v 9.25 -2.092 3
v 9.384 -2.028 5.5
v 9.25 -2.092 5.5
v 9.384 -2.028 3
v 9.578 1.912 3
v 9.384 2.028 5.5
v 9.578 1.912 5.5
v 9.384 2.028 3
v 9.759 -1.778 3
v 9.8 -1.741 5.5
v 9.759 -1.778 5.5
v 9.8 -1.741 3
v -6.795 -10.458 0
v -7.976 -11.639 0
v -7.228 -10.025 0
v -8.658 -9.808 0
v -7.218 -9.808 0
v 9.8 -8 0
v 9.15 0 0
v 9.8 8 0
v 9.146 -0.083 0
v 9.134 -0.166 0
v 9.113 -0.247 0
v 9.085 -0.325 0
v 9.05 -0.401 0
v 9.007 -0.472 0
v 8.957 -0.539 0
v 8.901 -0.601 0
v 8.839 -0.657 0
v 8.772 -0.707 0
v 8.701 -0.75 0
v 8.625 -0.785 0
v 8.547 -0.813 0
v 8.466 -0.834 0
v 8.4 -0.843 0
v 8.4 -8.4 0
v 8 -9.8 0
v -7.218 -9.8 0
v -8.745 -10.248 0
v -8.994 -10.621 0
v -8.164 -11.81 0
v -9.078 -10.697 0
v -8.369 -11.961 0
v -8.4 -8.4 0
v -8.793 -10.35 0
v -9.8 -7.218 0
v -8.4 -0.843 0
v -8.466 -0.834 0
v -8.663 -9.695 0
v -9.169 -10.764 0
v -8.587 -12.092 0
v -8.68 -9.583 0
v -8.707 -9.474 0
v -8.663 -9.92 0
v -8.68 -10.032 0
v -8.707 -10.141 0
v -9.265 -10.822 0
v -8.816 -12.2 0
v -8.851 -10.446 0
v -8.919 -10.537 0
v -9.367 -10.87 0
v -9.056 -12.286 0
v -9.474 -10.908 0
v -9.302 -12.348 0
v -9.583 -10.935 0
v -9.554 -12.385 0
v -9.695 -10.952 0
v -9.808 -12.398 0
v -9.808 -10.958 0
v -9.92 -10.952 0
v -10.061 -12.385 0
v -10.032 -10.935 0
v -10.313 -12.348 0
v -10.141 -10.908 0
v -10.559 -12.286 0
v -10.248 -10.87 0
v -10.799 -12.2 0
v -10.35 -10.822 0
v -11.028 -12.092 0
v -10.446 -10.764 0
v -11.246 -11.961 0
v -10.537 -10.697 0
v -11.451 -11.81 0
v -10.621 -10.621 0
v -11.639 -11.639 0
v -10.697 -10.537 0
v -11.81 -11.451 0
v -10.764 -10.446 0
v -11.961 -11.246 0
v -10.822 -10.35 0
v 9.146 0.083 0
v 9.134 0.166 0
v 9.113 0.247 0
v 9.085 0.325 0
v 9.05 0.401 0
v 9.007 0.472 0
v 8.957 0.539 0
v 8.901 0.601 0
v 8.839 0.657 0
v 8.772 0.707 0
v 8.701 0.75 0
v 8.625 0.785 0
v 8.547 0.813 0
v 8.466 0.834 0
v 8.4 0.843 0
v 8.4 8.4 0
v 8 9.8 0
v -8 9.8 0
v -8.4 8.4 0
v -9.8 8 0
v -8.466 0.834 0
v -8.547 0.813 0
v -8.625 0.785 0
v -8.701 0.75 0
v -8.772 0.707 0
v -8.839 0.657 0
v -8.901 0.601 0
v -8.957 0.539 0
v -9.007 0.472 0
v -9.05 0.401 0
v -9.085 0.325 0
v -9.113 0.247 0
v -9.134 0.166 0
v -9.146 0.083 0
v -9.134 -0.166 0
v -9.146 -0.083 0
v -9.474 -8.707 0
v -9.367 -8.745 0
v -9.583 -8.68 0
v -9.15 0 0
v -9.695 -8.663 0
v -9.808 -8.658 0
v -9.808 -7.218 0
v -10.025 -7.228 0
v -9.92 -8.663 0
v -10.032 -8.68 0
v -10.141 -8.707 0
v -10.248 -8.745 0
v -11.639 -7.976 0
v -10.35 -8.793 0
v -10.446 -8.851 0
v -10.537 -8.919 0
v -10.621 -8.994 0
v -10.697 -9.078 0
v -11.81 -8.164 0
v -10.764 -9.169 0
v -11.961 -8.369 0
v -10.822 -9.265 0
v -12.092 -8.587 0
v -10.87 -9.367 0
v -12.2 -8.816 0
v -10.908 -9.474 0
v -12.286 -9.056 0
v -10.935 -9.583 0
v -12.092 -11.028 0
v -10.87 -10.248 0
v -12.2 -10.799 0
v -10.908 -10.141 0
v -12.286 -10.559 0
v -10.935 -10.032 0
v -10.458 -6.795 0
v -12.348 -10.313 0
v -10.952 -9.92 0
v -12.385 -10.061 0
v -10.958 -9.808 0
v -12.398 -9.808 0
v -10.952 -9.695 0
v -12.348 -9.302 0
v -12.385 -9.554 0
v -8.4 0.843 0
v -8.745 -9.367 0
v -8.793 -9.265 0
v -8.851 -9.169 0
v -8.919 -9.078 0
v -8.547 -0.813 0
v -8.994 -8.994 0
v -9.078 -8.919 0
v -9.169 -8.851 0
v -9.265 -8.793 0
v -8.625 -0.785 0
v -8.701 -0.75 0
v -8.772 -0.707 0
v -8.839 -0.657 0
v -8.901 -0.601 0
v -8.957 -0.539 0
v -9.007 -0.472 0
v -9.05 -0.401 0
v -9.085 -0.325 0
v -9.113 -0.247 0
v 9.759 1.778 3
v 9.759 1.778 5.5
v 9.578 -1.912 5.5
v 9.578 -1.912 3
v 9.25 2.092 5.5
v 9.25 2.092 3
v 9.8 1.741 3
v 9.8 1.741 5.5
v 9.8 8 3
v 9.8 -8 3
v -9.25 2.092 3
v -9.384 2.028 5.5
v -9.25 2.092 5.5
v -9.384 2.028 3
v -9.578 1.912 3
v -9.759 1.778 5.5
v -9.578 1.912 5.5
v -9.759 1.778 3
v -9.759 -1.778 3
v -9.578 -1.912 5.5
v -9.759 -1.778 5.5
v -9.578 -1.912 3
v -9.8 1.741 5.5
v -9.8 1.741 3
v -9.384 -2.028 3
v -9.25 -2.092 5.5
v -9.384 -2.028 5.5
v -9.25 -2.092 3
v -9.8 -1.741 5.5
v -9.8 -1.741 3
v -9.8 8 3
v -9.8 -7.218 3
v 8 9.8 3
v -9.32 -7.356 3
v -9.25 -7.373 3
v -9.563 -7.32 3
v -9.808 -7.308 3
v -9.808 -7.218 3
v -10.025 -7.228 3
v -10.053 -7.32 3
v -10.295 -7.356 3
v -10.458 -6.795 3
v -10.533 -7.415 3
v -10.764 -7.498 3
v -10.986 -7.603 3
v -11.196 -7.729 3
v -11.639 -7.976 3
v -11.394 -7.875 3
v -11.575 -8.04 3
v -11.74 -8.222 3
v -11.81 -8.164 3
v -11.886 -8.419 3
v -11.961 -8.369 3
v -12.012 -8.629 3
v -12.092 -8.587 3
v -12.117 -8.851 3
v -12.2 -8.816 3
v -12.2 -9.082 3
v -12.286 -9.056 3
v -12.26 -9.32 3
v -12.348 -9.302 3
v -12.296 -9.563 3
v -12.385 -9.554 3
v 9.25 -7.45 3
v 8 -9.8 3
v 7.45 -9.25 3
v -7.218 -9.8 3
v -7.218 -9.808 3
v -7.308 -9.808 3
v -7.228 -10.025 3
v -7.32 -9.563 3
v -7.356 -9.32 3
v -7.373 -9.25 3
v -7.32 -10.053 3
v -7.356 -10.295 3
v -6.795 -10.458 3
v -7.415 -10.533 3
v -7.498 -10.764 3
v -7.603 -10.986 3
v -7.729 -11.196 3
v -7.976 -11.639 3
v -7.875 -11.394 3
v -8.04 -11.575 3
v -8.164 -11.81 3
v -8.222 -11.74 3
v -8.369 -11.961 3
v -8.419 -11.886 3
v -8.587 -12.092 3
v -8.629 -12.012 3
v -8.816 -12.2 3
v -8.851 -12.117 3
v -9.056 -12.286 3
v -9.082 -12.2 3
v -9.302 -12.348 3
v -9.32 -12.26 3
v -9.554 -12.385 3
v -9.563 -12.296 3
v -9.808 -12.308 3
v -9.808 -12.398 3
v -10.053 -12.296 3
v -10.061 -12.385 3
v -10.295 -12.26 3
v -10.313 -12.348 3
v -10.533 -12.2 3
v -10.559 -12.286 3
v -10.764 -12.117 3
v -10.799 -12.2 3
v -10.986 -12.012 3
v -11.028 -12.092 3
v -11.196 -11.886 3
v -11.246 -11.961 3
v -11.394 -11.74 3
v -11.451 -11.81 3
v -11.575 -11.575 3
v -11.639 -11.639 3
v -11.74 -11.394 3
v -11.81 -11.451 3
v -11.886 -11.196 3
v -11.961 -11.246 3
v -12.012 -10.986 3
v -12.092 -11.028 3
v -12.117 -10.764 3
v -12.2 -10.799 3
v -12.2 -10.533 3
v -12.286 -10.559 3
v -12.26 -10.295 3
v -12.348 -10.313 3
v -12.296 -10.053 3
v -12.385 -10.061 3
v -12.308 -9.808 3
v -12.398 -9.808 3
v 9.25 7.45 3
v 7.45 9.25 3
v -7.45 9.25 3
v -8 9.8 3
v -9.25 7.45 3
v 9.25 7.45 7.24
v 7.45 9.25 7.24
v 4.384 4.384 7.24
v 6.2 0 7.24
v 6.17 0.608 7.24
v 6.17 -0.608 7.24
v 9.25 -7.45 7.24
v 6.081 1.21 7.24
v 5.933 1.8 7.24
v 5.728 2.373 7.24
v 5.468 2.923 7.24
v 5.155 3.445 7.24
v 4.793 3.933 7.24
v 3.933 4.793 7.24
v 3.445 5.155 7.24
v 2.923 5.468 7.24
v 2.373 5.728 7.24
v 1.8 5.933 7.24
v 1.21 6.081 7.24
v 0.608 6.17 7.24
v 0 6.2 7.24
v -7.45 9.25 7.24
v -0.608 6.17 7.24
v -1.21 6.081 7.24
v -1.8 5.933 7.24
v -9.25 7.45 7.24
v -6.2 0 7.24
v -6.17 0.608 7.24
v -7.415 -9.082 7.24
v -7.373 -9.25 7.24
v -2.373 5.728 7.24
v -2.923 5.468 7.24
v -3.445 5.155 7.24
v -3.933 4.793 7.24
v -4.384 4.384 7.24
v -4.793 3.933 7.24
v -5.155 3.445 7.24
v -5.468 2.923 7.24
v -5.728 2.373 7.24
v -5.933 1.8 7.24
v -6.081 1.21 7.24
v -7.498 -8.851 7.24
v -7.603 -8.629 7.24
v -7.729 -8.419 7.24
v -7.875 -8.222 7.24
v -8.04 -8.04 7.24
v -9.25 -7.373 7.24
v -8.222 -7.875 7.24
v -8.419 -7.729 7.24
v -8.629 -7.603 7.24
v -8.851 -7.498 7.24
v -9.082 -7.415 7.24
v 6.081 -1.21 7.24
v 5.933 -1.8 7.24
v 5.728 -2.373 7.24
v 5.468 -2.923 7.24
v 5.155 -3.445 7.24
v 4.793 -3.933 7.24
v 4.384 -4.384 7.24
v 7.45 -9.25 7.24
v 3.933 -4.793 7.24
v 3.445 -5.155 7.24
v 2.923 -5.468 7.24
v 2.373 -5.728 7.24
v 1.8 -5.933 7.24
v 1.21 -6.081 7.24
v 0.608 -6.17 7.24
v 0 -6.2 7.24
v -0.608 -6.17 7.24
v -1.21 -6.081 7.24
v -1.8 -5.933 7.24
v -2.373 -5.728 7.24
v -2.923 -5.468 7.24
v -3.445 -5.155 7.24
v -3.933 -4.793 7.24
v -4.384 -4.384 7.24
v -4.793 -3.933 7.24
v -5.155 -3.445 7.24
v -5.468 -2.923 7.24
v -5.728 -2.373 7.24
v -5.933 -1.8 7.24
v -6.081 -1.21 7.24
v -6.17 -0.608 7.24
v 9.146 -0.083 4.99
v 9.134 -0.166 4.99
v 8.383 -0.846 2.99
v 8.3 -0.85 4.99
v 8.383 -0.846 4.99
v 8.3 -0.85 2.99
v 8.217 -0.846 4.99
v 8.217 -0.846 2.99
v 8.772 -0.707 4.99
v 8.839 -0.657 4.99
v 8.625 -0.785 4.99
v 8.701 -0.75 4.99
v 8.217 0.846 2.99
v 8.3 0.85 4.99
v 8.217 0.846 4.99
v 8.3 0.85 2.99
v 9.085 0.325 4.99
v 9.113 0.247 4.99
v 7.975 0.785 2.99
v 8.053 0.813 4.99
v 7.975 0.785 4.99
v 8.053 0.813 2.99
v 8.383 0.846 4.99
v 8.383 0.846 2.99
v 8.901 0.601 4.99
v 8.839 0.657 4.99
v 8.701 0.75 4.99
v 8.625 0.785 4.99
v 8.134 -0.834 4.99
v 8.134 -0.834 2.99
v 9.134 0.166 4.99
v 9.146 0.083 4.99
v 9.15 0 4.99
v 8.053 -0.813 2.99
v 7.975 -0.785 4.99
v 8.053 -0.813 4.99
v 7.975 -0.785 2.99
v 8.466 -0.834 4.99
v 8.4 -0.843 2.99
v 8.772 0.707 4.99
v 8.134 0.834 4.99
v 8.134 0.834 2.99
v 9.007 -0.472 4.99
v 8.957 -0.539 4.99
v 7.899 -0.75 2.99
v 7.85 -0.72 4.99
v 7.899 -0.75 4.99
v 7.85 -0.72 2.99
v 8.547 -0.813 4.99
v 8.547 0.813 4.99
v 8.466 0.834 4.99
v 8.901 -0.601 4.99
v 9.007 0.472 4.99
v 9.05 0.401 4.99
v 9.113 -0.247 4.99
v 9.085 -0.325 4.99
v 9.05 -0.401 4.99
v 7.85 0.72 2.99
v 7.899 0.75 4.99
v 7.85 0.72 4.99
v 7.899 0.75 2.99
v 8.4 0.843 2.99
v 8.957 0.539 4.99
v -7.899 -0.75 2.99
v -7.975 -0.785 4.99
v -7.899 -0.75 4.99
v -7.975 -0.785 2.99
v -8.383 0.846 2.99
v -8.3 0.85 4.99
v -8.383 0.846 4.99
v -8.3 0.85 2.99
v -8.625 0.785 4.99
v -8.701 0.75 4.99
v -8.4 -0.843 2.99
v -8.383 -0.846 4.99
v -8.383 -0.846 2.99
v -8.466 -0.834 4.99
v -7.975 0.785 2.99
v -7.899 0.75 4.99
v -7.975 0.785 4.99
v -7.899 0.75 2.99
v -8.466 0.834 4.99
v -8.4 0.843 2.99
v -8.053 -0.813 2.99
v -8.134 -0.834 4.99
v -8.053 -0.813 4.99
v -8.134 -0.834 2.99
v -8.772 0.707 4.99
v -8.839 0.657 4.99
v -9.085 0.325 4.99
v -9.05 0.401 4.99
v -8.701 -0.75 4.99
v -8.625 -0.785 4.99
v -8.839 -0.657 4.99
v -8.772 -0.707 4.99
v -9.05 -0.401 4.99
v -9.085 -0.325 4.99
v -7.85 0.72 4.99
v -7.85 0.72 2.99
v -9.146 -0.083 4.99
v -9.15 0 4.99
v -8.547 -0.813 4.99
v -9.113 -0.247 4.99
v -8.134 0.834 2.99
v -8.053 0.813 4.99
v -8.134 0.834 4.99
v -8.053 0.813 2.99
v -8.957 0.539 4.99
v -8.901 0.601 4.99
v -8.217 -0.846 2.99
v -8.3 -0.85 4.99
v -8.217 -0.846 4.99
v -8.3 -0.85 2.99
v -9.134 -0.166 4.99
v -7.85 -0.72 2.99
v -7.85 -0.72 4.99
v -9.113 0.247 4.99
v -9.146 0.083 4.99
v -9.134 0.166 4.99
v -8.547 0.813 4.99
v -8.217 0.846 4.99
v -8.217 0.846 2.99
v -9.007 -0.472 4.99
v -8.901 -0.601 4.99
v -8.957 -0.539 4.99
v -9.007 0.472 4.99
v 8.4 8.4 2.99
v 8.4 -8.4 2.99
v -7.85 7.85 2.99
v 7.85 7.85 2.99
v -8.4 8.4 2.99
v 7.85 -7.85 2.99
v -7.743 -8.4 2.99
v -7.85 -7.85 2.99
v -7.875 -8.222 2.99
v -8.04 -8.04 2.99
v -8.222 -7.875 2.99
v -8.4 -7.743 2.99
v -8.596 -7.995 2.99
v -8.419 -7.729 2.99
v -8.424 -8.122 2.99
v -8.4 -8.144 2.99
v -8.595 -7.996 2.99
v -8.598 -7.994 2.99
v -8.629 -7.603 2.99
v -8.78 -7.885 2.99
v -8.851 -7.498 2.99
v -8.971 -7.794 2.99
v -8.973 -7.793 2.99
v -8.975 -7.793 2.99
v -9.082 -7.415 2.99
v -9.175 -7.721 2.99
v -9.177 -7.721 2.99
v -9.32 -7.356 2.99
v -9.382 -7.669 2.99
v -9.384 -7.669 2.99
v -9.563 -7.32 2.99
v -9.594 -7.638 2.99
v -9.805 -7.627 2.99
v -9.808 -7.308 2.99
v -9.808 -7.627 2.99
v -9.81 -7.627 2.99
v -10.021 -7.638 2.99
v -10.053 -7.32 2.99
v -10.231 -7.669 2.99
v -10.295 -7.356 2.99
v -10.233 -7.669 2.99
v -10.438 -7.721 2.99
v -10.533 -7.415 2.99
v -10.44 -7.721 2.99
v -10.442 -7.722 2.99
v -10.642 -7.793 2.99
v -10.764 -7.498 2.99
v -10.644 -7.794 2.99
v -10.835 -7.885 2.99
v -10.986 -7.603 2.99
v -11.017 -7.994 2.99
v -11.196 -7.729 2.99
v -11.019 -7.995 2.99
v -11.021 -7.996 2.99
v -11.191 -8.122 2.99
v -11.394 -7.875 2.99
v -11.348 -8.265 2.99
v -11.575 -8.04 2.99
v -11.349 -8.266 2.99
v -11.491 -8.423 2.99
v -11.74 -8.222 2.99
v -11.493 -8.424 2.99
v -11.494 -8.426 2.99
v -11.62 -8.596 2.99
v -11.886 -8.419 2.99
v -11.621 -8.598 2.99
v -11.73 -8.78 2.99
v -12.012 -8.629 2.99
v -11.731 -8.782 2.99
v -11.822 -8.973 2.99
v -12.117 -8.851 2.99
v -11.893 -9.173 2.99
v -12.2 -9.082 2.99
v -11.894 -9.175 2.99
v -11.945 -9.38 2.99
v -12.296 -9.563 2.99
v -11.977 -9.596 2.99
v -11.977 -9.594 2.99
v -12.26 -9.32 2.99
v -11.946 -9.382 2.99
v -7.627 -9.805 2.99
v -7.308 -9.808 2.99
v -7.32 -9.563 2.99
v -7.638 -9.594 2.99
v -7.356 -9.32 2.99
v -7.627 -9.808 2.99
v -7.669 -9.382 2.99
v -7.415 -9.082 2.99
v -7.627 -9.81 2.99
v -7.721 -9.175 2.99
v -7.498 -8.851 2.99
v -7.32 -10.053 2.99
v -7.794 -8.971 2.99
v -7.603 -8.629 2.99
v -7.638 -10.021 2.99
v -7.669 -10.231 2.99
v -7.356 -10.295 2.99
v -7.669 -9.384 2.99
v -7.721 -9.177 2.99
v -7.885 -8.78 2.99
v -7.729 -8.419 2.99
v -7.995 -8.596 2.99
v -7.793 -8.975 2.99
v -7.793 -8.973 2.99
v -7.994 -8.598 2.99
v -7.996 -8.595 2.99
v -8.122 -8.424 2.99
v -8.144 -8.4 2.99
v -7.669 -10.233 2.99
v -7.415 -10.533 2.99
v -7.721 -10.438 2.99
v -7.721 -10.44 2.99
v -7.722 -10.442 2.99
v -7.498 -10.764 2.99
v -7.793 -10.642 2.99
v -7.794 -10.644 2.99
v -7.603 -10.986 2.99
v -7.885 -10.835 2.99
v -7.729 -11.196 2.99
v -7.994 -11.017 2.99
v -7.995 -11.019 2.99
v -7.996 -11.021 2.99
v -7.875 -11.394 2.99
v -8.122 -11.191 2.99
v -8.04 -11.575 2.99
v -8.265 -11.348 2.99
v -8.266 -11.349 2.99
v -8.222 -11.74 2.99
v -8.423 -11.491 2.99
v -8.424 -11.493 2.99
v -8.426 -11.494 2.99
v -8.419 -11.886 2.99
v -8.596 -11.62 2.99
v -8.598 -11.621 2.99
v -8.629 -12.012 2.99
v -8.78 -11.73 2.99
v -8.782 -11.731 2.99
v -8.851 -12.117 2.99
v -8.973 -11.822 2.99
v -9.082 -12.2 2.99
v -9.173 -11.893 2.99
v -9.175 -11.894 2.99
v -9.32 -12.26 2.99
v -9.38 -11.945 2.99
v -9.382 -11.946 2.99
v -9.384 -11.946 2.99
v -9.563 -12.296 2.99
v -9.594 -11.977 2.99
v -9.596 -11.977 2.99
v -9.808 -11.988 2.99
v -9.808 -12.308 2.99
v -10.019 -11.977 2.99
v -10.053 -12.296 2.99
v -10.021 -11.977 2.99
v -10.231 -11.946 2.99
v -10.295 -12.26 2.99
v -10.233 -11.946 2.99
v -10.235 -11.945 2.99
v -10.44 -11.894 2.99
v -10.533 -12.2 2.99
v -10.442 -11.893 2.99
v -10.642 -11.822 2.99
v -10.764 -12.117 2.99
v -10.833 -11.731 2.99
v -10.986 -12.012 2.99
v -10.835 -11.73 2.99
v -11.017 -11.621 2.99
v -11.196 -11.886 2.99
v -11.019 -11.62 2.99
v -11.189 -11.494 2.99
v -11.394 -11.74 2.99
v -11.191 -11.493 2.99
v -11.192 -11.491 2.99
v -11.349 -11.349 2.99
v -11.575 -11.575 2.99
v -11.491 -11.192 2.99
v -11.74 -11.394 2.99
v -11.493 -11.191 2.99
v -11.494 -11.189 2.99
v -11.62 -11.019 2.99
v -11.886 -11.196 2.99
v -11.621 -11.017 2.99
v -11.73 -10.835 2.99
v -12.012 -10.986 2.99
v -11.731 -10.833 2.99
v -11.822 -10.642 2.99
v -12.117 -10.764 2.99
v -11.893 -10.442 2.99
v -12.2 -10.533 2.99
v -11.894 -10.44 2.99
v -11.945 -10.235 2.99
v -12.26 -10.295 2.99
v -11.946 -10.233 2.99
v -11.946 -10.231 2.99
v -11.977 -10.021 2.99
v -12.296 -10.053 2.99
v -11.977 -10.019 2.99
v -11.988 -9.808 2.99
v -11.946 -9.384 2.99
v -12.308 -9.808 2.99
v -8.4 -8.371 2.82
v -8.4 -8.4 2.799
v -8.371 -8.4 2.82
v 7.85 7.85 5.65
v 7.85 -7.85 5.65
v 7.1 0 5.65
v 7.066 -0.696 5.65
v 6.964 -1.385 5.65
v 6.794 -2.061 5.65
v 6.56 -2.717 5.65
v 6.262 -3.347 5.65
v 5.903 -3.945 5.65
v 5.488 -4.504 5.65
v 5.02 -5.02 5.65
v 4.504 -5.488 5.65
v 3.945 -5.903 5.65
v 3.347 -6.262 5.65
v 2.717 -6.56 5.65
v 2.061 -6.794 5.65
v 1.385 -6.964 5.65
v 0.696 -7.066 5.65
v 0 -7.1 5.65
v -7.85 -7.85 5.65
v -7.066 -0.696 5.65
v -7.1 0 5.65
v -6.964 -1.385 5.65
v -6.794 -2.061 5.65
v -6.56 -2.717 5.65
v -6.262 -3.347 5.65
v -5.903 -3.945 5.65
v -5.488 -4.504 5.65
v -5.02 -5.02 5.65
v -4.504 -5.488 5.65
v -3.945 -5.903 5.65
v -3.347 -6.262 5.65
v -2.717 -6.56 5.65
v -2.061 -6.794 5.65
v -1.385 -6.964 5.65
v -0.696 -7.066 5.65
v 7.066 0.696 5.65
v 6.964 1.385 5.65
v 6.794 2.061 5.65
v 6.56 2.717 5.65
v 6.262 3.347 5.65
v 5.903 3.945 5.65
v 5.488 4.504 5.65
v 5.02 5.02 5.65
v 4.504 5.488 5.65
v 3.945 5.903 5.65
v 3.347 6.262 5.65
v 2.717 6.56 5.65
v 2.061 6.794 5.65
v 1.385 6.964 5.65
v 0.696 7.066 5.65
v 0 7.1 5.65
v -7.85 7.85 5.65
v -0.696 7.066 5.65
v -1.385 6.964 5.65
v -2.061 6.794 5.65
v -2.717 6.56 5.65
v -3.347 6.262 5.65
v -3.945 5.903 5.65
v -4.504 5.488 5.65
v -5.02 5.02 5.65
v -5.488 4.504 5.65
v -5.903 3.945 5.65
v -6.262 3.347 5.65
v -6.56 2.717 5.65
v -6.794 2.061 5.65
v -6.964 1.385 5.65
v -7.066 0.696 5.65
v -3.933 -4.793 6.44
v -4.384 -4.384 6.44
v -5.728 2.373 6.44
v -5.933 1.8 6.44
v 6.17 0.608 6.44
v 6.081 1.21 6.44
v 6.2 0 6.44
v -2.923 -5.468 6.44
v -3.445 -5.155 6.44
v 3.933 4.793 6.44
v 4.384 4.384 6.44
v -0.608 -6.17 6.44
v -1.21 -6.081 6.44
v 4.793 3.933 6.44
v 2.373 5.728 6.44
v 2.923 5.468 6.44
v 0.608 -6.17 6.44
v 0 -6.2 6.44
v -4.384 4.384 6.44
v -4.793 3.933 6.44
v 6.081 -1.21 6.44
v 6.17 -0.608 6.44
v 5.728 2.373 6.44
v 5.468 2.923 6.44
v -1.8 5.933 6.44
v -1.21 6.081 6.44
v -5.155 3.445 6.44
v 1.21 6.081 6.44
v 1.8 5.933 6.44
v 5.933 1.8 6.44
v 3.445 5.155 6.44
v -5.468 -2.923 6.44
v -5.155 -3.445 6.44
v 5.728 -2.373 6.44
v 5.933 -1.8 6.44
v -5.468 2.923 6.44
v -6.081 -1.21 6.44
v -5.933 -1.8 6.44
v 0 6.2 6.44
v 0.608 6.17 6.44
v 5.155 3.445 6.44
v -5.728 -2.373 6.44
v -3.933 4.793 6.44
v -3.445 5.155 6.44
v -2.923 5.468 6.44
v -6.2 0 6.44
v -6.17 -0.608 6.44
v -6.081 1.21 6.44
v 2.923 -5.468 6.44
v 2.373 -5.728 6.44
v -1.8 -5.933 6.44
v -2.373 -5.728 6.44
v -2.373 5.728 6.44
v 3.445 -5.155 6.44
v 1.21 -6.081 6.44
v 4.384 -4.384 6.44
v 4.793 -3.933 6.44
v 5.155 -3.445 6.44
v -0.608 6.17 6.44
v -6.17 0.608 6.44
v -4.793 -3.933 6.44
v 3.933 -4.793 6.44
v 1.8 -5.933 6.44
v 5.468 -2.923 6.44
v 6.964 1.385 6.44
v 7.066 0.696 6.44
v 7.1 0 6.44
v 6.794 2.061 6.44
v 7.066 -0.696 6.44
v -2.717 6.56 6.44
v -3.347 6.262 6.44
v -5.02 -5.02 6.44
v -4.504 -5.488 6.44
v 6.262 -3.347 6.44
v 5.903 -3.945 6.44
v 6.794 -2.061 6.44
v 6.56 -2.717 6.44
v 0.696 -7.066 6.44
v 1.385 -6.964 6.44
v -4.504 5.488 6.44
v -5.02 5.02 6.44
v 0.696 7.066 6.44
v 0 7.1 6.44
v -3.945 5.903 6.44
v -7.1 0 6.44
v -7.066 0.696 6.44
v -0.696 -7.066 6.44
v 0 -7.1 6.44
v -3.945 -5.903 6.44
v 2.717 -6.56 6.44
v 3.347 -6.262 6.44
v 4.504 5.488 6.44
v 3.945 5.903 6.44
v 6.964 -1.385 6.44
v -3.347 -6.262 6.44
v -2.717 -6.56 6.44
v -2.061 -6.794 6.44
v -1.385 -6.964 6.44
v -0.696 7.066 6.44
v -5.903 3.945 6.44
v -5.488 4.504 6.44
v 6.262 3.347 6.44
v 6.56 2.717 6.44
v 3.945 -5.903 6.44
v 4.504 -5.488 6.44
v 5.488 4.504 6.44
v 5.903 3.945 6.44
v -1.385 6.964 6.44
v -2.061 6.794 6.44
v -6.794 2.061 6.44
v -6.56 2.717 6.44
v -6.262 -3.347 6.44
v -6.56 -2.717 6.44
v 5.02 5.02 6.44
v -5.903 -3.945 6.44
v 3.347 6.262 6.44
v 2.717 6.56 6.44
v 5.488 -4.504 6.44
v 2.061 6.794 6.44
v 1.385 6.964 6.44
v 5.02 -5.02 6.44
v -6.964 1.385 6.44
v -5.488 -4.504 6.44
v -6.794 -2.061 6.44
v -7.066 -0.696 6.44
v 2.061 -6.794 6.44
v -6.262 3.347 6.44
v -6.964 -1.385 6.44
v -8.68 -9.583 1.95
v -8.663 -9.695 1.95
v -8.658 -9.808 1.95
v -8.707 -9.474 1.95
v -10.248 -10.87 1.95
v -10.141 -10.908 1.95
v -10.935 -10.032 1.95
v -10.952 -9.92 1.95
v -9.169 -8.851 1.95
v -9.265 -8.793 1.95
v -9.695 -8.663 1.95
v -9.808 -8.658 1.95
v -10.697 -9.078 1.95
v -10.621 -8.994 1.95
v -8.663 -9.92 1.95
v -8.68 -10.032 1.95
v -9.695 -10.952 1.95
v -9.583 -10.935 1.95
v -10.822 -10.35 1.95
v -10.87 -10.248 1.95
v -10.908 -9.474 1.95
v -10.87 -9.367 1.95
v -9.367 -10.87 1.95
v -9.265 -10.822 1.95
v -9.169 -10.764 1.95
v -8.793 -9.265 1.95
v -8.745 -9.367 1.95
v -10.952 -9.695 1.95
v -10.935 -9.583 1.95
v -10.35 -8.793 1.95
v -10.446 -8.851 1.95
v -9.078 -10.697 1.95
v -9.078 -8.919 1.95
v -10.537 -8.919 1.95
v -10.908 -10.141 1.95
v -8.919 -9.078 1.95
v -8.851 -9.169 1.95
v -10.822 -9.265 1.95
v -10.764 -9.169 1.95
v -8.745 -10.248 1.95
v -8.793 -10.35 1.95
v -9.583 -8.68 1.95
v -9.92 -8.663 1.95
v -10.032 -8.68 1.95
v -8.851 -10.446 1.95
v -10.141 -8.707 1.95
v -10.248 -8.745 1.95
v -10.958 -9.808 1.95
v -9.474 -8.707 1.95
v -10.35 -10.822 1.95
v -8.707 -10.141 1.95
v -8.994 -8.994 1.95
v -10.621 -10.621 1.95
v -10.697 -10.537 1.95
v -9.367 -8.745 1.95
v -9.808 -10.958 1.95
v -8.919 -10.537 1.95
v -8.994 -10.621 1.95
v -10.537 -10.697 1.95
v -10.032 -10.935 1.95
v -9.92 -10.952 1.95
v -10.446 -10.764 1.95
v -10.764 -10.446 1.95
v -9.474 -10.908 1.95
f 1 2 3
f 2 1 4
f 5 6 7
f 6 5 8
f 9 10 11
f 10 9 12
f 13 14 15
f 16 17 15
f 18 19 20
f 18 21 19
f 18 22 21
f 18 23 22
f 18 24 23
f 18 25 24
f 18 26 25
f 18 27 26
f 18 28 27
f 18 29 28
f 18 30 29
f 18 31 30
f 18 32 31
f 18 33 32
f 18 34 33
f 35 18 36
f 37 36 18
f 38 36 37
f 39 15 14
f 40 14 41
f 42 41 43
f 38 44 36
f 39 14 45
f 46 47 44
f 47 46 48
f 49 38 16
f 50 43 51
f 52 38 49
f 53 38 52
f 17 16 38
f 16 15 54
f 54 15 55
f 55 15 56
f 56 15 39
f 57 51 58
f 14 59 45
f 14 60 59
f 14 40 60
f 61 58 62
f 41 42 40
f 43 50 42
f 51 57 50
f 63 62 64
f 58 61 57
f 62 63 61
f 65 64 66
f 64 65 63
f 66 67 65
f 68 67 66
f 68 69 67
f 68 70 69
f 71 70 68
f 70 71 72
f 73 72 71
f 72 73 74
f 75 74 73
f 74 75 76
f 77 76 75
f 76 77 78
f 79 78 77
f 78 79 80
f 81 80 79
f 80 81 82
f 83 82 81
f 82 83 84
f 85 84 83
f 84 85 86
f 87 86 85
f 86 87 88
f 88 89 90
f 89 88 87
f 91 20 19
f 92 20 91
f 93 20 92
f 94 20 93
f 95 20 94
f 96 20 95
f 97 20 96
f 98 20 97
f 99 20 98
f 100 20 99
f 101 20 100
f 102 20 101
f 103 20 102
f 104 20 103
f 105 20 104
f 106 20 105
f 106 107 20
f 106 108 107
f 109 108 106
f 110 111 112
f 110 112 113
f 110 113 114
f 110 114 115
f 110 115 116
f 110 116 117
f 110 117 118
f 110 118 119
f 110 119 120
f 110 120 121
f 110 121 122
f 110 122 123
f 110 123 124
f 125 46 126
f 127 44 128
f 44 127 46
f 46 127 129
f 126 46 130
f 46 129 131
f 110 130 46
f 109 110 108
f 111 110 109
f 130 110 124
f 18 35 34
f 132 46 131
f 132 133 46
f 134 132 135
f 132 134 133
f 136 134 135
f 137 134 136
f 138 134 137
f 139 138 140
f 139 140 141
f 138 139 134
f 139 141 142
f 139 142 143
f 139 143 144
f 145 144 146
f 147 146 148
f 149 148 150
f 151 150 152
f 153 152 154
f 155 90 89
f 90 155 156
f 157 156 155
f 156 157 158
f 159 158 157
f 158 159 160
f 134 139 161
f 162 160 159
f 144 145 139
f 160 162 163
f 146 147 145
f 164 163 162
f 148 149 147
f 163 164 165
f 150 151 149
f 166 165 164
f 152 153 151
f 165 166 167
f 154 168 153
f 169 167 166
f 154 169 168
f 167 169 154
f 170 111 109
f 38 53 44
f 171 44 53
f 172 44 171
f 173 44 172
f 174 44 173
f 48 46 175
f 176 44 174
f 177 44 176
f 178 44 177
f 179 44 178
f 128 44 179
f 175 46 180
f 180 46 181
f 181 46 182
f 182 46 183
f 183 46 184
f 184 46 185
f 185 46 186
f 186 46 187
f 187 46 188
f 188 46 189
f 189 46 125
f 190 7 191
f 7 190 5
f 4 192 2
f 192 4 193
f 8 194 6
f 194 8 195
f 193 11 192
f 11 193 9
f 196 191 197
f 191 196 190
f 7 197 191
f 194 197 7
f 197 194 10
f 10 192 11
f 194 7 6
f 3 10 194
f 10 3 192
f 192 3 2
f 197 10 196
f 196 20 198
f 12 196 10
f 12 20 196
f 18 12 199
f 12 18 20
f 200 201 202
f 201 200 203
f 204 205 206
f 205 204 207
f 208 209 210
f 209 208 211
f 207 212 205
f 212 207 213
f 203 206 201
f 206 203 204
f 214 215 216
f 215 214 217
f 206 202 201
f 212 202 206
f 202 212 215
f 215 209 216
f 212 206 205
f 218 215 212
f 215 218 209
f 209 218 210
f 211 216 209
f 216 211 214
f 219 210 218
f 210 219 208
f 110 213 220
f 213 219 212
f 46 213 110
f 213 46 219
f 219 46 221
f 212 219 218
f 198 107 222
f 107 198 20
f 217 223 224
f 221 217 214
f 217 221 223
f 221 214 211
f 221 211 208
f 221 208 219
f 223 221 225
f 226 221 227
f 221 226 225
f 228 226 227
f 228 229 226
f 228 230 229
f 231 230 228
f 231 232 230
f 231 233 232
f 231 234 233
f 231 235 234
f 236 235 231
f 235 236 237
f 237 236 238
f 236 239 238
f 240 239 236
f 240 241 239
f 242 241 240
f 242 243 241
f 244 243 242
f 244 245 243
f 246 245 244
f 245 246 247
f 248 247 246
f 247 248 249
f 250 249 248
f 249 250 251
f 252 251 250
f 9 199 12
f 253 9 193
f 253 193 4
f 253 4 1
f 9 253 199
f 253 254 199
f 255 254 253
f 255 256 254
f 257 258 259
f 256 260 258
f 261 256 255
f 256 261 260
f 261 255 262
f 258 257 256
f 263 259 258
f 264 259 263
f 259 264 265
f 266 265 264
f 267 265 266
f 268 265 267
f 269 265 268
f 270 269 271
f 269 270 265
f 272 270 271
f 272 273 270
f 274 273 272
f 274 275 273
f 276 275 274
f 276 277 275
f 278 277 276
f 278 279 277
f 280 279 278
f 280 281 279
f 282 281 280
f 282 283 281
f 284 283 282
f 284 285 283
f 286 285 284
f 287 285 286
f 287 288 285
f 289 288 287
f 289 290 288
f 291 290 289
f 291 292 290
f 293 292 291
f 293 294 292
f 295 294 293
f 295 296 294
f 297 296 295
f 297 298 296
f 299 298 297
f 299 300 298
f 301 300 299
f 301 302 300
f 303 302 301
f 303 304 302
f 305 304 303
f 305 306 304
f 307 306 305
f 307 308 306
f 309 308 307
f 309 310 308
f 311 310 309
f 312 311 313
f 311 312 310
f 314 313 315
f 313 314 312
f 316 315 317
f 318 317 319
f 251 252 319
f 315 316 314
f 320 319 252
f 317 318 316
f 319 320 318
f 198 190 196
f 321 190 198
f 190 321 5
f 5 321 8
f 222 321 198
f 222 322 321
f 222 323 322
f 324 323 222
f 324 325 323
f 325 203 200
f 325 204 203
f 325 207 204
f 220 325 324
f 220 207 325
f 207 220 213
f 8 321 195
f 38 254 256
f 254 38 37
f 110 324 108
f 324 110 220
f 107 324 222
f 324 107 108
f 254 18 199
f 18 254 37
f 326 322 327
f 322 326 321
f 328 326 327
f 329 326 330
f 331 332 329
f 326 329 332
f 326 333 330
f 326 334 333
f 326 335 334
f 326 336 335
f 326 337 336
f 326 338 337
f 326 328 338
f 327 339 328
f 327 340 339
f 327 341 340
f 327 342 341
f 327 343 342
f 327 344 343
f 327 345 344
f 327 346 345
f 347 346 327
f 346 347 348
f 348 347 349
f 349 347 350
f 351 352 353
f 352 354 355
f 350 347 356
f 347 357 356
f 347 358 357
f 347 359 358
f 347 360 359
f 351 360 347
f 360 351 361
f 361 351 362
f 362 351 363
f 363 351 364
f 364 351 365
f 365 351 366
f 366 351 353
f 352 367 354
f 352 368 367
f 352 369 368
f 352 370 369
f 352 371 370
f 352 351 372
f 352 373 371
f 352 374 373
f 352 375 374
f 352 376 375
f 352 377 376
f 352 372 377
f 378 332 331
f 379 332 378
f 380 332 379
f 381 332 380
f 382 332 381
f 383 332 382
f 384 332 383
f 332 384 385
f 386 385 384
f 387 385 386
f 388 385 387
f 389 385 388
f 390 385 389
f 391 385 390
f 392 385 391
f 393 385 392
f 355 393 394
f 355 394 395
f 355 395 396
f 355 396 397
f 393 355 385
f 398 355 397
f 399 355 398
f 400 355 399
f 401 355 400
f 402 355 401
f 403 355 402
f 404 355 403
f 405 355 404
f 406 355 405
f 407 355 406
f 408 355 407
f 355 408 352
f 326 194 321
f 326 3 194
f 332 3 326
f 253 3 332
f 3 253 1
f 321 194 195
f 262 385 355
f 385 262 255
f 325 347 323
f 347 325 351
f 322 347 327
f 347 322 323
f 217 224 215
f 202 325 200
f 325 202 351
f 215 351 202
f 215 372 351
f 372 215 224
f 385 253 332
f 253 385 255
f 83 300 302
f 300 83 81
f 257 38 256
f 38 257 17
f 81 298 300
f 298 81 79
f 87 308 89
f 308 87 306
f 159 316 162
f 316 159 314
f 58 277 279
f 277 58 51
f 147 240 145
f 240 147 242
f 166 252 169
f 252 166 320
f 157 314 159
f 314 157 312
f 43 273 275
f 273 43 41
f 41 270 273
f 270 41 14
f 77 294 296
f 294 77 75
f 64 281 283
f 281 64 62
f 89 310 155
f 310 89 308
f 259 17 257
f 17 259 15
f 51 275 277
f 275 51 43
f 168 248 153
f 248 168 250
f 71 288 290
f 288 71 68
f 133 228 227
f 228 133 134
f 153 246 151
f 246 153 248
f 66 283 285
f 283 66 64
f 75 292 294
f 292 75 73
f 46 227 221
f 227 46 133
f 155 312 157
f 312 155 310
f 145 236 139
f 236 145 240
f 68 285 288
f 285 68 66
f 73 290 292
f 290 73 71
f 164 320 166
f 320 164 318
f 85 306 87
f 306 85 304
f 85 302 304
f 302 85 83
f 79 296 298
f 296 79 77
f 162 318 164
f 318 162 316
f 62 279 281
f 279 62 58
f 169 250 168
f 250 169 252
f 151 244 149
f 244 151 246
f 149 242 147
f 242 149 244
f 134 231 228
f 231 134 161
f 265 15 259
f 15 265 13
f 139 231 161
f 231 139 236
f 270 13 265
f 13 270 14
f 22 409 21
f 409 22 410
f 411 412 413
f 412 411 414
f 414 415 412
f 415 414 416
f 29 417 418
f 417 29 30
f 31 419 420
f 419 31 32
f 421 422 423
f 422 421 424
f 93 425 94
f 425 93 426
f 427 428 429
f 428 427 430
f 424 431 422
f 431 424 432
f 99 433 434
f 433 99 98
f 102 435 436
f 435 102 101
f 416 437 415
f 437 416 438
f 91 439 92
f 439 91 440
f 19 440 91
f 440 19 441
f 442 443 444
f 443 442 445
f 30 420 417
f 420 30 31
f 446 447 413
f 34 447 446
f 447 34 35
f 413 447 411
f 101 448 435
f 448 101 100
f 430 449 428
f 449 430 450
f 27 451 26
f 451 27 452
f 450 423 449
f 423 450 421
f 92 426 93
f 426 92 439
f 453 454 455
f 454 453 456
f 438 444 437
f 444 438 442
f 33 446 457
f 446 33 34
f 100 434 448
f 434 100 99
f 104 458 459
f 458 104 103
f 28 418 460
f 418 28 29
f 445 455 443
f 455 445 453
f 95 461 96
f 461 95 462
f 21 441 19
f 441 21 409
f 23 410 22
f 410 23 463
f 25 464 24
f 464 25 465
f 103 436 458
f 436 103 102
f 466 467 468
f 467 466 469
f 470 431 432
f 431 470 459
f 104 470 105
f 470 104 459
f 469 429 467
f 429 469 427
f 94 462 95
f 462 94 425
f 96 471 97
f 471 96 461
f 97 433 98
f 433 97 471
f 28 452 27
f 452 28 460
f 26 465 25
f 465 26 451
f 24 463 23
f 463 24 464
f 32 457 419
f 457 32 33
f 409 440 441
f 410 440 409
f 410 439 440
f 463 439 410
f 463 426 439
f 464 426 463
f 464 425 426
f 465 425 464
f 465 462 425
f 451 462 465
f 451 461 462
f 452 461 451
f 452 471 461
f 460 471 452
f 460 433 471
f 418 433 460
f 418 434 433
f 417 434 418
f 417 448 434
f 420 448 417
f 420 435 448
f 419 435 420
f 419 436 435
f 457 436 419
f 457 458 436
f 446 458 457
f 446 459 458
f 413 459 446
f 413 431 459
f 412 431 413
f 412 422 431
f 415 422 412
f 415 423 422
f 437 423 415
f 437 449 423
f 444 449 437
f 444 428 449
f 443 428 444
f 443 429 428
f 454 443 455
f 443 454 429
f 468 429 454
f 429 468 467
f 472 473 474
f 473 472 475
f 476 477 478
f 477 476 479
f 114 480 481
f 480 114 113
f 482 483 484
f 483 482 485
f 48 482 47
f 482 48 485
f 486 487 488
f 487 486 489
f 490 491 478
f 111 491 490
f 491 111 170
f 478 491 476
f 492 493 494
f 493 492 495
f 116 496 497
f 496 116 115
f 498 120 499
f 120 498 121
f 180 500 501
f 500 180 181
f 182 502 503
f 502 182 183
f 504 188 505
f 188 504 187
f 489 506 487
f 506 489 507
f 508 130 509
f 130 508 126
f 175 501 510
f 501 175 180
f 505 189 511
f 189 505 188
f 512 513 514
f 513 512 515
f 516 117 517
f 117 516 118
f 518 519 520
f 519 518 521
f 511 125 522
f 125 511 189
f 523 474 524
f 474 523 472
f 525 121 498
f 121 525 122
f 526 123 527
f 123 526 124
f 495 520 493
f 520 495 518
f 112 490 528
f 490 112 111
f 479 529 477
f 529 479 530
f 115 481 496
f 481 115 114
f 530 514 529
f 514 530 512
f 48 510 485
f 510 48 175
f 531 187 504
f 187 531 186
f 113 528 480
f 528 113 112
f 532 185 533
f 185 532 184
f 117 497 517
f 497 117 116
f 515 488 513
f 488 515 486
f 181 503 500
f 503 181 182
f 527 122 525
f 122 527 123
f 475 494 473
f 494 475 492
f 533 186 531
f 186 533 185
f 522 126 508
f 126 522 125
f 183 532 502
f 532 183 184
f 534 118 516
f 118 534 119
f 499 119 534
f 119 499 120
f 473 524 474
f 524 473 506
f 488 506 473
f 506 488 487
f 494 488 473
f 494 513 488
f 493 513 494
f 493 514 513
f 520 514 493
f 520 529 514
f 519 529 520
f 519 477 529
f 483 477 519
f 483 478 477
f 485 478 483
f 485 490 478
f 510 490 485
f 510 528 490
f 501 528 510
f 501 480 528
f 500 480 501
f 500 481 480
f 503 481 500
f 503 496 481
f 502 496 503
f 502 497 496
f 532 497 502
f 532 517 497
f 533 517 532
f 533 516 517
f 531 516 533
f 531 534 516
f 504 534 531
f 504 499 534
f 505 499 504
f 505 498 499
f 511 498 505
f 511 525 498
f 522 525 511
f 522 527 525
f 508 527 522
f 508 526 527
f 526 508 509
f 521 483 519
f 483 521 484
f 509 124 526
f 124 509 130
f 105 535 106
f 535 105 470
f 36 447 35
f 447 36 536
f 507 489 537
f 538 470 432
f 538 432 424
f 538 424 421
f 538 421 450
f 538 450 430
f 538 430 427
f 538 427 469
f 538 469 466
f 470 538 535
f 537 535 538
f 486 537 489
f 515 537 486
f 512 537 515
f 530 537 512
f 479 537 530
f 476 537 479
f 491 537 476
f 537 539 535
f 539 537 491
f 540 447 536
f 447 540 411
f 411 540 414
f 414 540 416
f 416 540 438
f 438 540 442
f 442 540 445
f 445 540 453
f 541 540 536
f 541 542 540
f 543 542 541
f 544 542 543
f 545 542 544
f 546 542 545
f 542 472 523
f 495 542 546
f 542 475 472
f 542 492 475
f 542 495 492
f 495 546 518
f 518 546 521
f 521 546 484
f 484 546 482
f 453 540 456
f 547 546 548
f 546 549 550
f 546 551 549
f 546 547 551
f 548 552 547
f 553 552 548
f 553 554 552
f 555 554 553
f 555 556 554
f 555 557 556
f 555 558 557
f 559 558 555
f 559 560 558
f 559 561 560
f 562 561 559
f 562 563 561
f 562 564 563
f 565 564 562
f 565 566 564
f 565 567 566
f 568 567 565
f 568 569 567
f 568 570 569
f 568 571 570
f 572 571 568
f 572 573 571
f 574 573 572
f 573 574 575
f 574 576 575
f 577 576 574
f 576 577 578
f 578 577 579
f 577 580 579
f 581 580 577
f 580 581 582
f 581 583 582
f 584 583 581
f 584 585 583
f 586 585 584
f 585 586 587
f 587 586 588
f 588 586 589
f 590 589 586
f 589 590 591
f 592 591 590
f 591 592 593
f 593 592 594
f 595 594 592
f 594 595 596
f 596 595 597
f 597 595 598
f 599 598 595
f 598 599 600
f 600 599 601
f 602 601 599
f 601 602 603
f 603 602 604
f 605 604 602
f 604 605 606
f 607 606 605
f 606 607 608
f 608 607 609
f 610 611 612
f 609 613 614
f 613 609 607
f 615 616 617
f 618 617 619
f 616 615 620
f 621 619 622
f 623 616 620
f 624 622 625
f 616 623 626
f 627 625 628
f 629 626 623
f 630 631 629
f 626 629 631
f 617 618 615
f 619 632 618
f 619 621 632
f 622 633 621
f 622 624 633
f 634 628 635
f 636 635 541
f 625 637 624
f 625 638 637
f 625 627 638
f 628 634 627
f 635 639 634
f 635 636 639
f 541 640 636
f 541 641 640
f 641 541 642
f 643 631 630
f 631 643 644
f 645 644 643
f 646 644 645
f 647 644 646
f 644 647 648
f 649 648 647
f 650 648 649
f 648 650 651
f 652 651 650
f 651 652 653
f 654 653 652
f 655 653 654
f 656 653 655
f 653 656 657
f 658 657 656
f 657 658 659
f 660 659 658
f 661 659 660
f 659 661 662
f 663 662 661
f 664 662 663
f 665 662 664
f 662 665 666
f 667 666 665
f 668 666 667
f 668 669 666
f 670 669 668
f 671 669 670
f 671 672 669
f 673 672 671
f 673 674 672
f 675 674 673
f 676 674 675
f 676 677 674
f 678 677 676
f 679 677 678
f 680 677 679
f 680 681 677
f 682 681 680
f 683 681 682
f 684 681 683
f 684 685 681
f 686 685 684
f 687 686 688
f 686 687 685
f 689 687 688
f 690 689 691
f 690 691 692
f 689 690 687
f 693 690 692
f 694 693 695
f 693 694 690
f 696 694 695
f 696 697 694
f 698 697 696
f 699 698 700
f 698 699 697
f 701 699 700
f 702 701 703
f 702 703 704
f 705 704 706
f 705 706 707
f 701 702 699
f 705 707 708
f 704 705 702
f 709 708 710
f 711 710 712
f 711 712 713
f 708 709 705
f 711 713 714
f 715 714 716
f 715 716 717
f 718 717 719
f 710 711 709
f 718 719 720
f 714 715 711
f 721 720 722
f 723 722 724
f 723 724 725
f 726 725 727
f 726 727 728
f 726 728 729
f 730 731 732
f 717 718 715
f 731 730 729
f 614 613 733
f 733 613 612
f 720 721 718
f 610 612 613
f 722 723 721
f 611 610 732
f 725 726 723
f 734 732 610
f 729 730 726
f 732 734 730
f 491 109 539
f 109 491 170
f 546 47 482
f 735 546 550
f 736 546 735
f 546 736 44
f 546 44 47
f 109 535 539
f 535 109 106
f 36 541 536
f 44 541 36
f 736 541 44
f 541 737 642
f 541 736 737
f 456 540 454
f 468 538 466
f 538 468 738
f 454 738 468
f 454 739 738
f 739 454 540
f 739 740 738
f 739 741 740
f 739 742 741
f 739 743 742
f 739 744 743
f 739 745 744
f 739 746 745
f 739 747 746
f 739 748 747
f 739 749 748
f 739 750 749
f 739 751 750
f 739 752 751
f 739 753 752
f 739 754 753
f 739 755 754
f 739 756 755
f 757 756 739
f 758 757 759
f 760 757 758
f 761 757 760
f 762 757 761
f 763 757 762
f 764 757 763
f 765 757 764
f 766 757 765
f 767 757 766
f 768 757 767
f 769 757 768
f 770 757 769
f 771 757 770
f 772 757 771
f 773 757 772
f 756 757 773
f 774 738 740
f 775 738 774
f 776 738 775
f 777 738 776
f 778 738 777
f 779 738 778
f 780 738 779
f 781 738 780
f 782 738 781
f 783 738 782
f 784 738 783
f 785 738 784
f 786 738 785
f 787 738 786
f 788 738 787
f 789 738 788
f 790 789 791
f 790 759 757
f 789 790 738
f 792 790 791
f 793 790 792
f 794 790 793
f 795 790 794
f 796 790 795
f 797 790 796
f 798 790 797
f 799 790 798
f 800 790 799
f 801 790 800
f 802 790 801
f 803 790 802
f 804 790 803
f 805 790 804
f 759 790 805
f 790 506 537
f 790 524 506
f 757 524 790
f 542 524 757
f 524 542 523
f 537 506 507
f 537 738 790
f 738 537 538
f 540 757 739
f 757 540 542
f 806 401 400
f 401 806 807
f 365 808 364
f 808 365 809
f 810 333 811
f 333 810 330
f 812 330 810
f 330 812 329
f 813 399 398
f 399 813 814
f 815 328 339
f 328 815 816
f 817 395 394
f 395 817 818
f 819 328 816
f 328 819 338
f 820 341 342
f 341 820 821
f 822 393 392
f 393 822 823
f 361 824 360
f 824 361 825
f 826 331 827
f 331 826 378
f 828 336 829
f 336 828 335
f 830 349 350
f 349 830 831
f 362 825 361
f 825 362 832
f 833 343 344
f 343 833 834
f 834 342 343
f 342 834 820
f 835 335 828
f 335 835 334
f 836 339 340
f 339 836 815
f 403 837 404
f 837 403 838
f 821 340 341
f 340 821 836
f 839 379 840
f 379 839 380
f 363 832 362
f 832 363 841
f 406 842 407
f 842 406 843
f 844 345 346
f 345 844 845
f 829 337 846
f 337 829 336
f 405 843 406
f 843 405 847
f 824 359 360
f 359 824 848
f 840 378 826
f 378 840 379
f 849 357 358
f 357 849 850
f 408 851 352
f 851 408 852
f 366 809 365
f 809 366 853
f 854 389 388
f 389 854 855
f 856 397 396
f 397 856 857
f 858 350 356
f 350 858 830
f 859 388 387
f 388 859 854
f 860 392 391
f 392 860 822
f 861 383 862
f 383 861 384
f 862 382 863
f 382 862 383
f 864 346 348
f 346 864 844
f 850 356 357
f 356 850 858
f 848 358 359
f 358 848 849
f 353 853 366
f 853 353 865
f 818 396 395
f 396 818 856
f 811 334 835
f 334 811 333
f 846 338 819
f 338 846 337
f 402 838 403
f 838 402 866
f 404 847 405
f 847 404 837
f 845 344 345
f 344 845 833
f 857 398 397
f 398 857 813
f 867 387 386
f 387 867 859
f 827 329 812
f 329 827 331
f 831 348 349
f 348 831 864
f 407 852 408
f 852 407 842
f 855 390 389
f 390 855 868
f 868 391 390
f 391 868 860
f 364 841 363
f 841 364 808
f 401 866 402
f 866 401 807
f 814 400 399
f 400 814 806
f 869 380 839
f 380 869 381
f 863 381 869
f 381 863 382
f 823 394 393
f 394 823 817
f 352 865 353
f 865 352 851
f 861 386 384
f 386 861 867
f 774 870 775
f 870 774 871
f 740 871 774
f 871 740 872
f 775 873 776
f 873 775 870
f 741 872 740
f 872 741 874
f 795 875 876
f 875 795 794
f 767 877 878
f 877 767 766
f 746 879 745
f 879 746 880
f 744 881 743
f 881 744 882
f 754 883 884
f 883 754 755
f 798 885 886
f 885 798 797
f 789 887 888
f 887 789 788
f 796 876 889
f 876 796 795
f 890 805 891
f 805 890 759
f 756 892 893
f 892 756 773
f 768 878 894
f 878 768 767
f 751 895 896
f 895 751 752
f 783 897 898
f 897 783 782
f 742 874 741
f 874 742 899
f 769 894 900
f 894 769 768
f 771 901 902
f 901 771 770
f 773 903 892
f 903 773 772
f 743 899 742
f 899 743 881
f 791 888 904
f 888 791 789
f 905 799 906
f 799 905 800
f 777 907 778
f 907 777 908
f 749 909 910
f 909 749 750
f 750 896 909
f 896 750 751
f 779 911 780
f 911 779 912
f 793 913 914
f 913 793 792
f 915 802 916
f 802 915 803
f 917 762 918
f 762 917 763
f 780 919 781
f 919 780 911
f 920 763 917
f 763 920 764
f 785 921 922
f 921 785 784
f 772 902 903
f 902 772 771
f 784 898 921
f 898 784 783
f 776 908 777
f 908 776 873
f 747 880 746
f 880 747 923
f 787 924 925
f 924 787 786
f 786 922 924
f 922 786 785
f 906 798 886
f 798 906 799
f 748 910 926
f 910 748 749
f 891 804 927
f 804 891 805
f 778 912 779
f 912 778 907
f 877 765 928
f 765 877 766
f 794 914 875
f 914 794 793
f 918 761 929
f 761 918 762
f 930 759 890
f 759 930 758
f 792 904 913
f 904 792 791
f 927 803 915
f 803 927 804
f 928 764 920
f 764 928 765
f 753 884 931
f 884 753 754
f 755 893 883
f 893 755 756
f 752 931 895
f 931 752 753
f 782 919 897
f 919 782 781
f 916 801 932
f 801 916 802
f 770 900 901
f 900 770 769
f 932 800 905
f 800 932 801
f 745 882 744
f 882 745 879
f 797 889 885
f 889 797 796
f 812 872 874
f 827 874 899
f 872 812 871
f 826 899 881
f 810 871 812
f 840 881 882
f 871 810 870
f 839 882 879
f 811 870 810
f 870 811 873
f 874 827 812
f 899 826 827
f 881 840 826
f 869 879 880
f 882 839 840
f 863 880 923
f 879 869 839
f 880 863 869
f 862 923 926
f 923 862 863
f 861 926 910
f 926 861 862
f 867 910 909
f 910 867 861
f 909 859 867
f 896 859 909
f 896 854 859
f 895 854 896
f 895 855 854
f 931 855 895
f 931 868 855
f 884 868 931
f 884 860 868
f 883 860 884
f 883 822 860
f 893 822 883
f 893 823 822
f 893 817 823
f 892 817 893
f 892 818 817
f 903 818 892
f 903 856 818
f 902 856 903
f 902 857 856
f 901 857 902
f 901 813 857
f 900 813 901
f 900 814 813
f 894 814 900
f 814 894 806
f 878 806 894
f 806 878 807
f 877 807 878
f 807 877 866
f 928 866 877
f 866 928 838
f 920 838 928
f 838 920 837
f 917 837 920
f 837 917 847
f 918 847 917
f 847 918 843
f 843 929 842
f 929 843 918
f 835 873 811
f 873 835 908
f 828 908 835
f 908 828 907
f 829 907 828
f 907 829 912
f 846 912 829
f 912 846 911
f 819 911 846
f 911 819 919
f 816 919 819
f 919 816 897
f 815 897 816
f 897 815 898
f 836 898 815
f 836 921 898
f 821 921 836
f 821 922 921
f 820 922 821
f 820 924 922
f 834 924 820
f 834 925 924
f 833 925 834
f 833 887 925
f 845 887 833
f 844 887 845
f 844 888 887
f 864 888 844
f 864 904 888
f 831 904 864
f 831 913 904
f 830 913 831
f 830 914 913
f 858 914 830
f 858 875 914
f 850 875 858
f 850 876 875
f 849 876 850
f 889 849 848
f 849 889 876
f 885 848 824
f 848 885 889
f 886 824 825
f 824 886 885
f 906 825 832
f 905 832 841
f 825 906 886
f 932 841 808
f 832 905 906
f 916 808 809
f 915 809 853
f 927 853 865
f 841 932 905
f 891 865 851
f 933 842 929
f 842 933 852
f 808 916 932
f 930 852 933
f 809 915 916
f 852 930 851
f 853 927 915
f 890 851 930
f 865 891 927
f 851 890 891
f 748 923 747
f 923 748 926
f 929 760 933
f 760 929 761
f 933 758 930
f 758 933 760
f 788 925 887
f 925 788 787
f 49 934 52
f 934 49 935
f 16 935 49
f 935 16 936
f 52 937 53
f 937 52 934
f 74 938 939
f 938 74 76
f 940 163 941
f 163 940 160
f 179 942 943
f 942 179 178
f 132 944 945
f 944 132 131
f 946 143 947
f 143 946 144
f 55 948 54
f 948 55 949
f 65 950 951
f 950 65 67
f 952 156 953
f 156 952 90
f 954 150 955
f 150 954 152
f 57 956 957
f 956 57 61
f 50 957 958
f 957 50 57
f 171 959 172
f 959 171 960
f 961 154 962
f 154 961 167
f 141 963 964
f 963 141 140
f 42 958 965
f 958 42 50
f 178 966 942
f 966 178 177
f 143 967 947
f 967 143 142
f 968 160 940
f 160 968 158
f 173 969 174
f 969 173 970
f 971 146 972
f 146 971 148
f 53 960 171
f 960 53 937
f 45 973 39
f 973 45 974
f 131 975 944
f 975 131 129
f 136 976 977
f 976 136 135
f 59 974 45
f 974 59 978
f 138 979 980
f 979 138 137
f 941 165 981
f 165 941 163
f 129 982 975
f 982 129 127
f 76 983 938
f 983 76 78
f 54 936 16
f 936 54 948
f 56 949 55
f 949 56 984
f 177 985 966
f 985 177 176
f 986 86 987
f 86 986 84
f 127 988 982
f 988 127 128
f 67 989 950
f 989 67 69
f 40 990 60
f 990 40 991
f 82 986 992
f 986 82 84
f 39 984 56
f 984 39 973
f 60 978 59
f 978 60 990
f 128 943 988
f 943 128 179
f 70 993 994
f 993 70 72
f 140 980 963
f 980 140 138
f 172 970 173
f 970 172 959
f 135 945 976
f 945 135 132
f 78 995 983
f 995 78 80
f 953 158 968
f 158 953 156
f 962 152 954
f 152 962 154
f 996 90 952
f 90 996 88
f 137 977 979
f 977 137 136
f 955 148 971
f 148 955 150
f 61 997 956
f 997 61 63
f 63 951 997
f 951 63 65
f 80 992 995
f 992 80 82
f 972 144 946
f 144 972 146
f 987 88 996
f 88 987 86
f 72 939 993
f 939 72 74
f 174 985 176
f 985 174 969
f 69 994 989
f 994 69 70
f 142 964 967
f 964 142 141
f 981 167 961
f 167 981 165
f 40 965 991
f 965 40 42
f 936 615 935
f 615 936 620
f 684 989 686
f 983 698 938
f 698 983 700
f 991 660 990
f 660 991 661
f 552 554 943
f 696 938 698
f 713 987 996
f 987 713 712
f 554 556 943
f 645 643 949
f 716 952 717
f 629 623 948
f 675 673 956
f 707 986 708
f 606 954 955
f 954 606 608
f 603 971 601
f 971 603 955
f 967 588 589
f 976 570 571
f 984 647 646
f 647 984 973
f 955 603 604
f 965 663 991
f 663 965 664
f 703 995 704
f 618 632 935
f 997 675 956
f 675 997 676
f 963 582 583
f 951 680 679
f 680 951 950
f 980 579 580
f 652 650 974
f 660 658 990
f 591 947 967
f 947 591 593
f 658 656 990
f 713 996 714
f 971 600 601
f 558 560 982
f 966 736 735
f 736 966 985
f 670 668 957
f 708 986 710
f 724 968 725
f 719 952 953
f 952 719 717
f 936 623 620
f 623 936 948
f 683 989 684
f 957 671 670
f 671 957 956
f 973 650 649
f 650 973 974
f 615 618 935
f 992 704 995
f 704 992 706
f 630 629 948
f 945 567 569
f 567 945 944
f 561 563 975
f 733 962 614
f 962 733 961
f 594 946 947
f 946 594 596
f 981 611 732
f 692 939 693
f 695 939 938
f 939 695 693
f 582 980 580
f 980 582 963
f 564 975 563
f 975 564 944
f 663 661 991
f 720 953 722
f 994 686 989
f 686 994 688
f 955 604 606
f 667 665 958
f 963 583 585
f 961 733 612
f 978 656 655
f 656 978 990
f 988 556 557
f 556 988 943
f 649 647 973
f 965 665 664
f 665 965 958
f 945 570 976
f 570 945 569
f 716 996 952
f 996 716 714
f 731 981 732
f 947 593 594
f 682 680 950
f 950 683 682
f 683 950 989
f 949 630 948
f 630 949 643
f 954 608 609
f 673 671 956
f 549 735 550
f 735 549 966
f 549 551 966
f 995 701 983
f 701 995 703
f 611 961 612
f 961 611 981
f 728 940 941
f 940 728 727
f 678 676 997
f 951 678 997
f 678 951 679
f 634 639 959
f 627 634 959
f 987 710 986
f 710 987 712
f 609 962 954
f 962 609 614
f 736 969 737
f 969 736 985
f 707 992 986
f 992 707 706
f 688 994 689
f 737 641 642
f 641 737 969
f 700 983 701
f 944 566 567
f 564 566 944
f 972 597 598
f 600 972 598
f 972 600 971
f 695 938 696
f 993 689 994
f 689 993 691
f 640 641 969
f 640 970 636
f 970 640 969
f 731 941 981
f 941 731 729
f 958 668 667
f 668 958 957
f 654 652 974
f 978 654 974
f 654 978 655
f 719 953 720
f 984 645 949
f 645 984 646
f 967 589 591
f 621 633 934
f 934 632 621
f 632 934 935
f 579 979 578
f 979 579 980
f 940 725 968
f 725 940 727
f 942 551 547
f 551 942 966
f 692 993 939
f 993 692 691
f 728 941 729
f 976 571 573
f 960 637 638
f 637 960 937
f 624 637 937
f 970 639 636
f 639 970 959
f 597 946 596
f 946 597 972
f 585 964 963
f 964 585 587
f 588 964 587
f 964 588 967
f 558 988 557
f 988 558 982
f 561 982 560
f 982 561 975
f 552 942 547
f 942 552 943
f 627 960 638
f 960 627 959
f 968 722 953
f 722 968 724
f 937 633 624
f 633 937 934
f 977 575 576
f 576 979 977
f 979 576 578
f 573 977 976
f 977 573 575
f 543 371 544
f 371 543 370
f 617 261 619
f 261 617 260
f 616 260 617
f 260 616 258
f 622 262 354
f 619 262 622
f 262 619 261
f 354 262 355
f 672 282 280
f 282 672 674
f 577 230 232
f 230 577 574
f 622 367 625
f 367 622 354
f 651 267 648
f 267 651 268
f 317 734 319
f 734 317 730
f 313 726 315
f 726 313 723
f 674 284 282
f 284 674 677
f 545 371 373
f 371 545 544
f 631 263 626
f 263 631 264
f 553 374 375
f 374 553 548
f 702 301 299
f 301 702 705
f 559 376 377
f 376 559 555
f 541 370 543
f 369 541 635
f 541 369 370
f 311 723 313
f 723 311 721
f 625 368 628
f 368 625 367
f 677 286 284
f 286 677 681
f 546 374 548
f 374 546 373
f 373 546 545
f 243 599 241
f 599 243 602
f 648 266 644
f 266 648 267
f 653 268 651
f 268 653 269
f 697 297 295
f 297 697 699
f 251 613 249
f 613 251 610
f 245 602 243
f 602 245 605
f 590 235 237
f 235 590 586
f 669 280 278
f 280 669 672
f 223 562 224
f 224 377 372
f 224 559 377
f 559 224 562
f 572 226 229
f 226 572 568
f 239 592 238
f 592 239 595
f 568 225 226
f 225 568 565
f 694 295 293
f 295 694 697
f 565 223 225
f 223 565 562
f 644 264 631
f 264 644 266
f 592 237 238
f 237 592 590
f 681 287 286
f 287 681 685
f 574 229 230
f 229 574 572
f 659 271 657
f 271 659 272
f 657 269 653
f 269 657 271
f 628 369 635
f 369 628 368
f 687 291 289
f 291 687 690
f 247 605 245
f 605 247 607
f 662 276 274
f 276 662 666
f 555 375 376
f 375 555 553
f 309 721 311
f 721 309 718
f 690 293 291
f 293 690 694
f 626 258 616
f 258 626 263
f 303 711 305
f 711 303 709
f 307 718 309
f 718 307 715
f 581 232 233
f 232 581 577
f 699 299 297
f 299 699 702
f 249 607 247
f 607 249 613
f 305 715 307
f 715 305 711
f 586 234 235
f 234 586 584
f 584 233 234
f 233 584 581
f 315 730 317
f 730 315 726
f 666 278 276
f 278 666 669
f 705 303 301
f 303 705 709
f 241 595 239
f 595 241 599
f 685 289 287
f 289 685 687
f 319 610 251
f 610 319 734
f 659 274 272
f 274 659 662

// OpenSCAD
// TouchID module housing — parametric OpenSCAD (v3, caliper-measured)
// Mirrors touchid_module.py. Two-tier body:
//   tier 1 (back, z 0..lip_h):     19.72 sq lip — PCB mounts on its back
//   tier 2 (top, z lip_h..body_h): 18.64 sq — top face flush with enclosure
// Z=0 = BACK (PCB/pogo side). Housing top view = mirror-x of pad-side view.
// MEASURED: 18.64 x 18.64 x 8.44; lip 19.72 x 4.20; ear diagonal 30.4.

FIT = 0.14;
body_w = 18.64 - FIT;  body_l = 18.64 - FIT;   // top tier
lip_w  = 19.72 - 0.12; lip_l  = 19.72 - 0.12;  // back lip tier
pcb_t_ref = 1.2;
lip_h  = 4.20 - pcb_t_ref;   // 3.0 plastic lip (measured 4.20 included PCB edge)
body_h = 8.44 - pcb_t_ref;  // 7.24 housing; assembled with PCB = 8.44
corner_ch = 1.8;  top_t = 1.6;  wall_t = 1.4;

sensor_window_d = 12.4;  // SET TO YOUR SENSOR
sensor_body_d   = 14.2;
sensor_lip_t    = 0.8;

// MEASURED arm: 5.18 wide, 3.0 thick; tip-to-opposite-corner diagonal 30.4
arm_w = 5.18;
ear_r = arm_w / 2;                  // rounded tip radius 2.59
ear_diag = 16.46 - ear_r;           // hole center from module center = 13.87
ear_t = 3.0;
ear_hole_d = 2.3; ear_csk_d = 4.4;
ear_sx = -1; ear_sy = -1;

pcb_screw_pilot_d = 1.7; pcb_screw_depth = 5.0;
pcb_screw_pos = [[8.3, 0], [-8.3, 0]];  // relocated for ESP32 clearance
boss_flat_x = 6.75;                     // inner flat on bosses
post_d = 2.0; post_h = 2.0;
post_pos = [];  // no posts

$fn = 64;
u = 0.70710678;
ex = ear_sx * ear_diag * u;
ey = ear_sy * ear_diag * u;
ear_offset = ear_diag - (lip_w/2) * 1.41421;

module oct2d(w, l) {
    polygon([
        [-w/2+corner_ch, -l/2], [ w/2-corner_ch, -l/2],
        [ w/2, -l/2+corner_ch], [ w/2,  l/2-corner_ch],
        [ w/2-corner_ch,  l/2], [-w/2+corner_ch,  l/2],
        [-w/2, l/2-corner_ch], [-w/2, -l/2+corner_ch]]);
}

difference() {
    union() {
        linear_extrude(lip_h) oct2d(lip_w, lip_l);                     // lip tier
        translate([0,0,lip_h]) linear_extrude(body_h-lip_h) oct2d(body_w, body_l); // top tier
        // arm: top face at the lip step (z = lip_h), 3.0 deep
        translate([ex, ey, 0]) cylinder(h = ear_t, d = 2*ear_r);
        translate([ear_sx*(12.2+ear_diag)/2*u, ear_sy*(12.2+ear_diag)/2*u, 0])
            rotate([0, 0, (ear_sx*ear_sy > 0) ? 45 : -45]) translate([0,0,ear_t/2])
            cube([ear_diag - 12.2, 2*ear_r, ear_t], center = true);    // short bridge
        for (p = pcb_screw_pos)                                        // screw bosses
            intersection() {
                translate([p[0], p[1], 0]) cylinder(h = pcb_screw_depth + 0.5, d = 4.6);
                linear_extrude(body_h) oct2d(lip_w, lip_l);
                // inner flat so the ESP32 module clears
                translate([sign(p[0])*(boss_flat_x + 15), p[1], pcb_screw_depth/2])
                    cube([30, 30, pcb_screw_depth + 2], center = true);
            }
        for (p = post_pos)                                             // alignment post
            translate([p[0], p[1], -post_h]) cylinder(h = post_h, d = post_d);
    }
    // stepped interior cavity: bigger in the lip tier (fits ESP32-C3-MINI-1)
    translate([0, 0, -0.01])
        cube([lip_w - 2*wall_t, lip_l - 2*wall_t, 2*lip_h], center = true);
    translate([-(body_w - 2*wall_t)/2, -(body_l - 2*wall_t)/2, lip_h - 0.01])
        cube([body_w - 2*wall_t, body_l - 2*wall_t, body_h - top_t - lip_h + 0.02]);
    // sensor window + counterbore leaving retaining lip
    translate([0, 0, -1]) cylinder(h = body_h + 2, d = sensor_window_d);
    translate([0, 0, body_h - top_t - 0.01])
        cylinder(h = top_t - sensor_lip_t + 0.01, d = sensor_body_d);
    // ear screw hole + 90deg countersink (opens at arm top face, z = lip_h)
    translate([ex, ey, -1]) cylinder(h = ear_t + 2, d = ear_hole_d);
    translate([ex, ey, ear_t - (ear_csk_d - ear_hole_d)/2])
        cylinder(h = (ear_csk_d - ear_hole_d)/2 + 0.01, d1 = ear_hole_d, d2 = ear_csk_d);
    // screwdriver/head relief above the arm
    translate([ex, ey, ear_t - 0.01]) cylinder(h = body_h - ear_t + 0.02, d = ear_csk_d + 0.6);
    // PCB screw pilot holes
    for (p = pcb_screw_pos)
        translate([p[0], p[1], -0.01]) cylinder(h = pcb_screw_depth, d = pcb_screw_pilot_d);
}
